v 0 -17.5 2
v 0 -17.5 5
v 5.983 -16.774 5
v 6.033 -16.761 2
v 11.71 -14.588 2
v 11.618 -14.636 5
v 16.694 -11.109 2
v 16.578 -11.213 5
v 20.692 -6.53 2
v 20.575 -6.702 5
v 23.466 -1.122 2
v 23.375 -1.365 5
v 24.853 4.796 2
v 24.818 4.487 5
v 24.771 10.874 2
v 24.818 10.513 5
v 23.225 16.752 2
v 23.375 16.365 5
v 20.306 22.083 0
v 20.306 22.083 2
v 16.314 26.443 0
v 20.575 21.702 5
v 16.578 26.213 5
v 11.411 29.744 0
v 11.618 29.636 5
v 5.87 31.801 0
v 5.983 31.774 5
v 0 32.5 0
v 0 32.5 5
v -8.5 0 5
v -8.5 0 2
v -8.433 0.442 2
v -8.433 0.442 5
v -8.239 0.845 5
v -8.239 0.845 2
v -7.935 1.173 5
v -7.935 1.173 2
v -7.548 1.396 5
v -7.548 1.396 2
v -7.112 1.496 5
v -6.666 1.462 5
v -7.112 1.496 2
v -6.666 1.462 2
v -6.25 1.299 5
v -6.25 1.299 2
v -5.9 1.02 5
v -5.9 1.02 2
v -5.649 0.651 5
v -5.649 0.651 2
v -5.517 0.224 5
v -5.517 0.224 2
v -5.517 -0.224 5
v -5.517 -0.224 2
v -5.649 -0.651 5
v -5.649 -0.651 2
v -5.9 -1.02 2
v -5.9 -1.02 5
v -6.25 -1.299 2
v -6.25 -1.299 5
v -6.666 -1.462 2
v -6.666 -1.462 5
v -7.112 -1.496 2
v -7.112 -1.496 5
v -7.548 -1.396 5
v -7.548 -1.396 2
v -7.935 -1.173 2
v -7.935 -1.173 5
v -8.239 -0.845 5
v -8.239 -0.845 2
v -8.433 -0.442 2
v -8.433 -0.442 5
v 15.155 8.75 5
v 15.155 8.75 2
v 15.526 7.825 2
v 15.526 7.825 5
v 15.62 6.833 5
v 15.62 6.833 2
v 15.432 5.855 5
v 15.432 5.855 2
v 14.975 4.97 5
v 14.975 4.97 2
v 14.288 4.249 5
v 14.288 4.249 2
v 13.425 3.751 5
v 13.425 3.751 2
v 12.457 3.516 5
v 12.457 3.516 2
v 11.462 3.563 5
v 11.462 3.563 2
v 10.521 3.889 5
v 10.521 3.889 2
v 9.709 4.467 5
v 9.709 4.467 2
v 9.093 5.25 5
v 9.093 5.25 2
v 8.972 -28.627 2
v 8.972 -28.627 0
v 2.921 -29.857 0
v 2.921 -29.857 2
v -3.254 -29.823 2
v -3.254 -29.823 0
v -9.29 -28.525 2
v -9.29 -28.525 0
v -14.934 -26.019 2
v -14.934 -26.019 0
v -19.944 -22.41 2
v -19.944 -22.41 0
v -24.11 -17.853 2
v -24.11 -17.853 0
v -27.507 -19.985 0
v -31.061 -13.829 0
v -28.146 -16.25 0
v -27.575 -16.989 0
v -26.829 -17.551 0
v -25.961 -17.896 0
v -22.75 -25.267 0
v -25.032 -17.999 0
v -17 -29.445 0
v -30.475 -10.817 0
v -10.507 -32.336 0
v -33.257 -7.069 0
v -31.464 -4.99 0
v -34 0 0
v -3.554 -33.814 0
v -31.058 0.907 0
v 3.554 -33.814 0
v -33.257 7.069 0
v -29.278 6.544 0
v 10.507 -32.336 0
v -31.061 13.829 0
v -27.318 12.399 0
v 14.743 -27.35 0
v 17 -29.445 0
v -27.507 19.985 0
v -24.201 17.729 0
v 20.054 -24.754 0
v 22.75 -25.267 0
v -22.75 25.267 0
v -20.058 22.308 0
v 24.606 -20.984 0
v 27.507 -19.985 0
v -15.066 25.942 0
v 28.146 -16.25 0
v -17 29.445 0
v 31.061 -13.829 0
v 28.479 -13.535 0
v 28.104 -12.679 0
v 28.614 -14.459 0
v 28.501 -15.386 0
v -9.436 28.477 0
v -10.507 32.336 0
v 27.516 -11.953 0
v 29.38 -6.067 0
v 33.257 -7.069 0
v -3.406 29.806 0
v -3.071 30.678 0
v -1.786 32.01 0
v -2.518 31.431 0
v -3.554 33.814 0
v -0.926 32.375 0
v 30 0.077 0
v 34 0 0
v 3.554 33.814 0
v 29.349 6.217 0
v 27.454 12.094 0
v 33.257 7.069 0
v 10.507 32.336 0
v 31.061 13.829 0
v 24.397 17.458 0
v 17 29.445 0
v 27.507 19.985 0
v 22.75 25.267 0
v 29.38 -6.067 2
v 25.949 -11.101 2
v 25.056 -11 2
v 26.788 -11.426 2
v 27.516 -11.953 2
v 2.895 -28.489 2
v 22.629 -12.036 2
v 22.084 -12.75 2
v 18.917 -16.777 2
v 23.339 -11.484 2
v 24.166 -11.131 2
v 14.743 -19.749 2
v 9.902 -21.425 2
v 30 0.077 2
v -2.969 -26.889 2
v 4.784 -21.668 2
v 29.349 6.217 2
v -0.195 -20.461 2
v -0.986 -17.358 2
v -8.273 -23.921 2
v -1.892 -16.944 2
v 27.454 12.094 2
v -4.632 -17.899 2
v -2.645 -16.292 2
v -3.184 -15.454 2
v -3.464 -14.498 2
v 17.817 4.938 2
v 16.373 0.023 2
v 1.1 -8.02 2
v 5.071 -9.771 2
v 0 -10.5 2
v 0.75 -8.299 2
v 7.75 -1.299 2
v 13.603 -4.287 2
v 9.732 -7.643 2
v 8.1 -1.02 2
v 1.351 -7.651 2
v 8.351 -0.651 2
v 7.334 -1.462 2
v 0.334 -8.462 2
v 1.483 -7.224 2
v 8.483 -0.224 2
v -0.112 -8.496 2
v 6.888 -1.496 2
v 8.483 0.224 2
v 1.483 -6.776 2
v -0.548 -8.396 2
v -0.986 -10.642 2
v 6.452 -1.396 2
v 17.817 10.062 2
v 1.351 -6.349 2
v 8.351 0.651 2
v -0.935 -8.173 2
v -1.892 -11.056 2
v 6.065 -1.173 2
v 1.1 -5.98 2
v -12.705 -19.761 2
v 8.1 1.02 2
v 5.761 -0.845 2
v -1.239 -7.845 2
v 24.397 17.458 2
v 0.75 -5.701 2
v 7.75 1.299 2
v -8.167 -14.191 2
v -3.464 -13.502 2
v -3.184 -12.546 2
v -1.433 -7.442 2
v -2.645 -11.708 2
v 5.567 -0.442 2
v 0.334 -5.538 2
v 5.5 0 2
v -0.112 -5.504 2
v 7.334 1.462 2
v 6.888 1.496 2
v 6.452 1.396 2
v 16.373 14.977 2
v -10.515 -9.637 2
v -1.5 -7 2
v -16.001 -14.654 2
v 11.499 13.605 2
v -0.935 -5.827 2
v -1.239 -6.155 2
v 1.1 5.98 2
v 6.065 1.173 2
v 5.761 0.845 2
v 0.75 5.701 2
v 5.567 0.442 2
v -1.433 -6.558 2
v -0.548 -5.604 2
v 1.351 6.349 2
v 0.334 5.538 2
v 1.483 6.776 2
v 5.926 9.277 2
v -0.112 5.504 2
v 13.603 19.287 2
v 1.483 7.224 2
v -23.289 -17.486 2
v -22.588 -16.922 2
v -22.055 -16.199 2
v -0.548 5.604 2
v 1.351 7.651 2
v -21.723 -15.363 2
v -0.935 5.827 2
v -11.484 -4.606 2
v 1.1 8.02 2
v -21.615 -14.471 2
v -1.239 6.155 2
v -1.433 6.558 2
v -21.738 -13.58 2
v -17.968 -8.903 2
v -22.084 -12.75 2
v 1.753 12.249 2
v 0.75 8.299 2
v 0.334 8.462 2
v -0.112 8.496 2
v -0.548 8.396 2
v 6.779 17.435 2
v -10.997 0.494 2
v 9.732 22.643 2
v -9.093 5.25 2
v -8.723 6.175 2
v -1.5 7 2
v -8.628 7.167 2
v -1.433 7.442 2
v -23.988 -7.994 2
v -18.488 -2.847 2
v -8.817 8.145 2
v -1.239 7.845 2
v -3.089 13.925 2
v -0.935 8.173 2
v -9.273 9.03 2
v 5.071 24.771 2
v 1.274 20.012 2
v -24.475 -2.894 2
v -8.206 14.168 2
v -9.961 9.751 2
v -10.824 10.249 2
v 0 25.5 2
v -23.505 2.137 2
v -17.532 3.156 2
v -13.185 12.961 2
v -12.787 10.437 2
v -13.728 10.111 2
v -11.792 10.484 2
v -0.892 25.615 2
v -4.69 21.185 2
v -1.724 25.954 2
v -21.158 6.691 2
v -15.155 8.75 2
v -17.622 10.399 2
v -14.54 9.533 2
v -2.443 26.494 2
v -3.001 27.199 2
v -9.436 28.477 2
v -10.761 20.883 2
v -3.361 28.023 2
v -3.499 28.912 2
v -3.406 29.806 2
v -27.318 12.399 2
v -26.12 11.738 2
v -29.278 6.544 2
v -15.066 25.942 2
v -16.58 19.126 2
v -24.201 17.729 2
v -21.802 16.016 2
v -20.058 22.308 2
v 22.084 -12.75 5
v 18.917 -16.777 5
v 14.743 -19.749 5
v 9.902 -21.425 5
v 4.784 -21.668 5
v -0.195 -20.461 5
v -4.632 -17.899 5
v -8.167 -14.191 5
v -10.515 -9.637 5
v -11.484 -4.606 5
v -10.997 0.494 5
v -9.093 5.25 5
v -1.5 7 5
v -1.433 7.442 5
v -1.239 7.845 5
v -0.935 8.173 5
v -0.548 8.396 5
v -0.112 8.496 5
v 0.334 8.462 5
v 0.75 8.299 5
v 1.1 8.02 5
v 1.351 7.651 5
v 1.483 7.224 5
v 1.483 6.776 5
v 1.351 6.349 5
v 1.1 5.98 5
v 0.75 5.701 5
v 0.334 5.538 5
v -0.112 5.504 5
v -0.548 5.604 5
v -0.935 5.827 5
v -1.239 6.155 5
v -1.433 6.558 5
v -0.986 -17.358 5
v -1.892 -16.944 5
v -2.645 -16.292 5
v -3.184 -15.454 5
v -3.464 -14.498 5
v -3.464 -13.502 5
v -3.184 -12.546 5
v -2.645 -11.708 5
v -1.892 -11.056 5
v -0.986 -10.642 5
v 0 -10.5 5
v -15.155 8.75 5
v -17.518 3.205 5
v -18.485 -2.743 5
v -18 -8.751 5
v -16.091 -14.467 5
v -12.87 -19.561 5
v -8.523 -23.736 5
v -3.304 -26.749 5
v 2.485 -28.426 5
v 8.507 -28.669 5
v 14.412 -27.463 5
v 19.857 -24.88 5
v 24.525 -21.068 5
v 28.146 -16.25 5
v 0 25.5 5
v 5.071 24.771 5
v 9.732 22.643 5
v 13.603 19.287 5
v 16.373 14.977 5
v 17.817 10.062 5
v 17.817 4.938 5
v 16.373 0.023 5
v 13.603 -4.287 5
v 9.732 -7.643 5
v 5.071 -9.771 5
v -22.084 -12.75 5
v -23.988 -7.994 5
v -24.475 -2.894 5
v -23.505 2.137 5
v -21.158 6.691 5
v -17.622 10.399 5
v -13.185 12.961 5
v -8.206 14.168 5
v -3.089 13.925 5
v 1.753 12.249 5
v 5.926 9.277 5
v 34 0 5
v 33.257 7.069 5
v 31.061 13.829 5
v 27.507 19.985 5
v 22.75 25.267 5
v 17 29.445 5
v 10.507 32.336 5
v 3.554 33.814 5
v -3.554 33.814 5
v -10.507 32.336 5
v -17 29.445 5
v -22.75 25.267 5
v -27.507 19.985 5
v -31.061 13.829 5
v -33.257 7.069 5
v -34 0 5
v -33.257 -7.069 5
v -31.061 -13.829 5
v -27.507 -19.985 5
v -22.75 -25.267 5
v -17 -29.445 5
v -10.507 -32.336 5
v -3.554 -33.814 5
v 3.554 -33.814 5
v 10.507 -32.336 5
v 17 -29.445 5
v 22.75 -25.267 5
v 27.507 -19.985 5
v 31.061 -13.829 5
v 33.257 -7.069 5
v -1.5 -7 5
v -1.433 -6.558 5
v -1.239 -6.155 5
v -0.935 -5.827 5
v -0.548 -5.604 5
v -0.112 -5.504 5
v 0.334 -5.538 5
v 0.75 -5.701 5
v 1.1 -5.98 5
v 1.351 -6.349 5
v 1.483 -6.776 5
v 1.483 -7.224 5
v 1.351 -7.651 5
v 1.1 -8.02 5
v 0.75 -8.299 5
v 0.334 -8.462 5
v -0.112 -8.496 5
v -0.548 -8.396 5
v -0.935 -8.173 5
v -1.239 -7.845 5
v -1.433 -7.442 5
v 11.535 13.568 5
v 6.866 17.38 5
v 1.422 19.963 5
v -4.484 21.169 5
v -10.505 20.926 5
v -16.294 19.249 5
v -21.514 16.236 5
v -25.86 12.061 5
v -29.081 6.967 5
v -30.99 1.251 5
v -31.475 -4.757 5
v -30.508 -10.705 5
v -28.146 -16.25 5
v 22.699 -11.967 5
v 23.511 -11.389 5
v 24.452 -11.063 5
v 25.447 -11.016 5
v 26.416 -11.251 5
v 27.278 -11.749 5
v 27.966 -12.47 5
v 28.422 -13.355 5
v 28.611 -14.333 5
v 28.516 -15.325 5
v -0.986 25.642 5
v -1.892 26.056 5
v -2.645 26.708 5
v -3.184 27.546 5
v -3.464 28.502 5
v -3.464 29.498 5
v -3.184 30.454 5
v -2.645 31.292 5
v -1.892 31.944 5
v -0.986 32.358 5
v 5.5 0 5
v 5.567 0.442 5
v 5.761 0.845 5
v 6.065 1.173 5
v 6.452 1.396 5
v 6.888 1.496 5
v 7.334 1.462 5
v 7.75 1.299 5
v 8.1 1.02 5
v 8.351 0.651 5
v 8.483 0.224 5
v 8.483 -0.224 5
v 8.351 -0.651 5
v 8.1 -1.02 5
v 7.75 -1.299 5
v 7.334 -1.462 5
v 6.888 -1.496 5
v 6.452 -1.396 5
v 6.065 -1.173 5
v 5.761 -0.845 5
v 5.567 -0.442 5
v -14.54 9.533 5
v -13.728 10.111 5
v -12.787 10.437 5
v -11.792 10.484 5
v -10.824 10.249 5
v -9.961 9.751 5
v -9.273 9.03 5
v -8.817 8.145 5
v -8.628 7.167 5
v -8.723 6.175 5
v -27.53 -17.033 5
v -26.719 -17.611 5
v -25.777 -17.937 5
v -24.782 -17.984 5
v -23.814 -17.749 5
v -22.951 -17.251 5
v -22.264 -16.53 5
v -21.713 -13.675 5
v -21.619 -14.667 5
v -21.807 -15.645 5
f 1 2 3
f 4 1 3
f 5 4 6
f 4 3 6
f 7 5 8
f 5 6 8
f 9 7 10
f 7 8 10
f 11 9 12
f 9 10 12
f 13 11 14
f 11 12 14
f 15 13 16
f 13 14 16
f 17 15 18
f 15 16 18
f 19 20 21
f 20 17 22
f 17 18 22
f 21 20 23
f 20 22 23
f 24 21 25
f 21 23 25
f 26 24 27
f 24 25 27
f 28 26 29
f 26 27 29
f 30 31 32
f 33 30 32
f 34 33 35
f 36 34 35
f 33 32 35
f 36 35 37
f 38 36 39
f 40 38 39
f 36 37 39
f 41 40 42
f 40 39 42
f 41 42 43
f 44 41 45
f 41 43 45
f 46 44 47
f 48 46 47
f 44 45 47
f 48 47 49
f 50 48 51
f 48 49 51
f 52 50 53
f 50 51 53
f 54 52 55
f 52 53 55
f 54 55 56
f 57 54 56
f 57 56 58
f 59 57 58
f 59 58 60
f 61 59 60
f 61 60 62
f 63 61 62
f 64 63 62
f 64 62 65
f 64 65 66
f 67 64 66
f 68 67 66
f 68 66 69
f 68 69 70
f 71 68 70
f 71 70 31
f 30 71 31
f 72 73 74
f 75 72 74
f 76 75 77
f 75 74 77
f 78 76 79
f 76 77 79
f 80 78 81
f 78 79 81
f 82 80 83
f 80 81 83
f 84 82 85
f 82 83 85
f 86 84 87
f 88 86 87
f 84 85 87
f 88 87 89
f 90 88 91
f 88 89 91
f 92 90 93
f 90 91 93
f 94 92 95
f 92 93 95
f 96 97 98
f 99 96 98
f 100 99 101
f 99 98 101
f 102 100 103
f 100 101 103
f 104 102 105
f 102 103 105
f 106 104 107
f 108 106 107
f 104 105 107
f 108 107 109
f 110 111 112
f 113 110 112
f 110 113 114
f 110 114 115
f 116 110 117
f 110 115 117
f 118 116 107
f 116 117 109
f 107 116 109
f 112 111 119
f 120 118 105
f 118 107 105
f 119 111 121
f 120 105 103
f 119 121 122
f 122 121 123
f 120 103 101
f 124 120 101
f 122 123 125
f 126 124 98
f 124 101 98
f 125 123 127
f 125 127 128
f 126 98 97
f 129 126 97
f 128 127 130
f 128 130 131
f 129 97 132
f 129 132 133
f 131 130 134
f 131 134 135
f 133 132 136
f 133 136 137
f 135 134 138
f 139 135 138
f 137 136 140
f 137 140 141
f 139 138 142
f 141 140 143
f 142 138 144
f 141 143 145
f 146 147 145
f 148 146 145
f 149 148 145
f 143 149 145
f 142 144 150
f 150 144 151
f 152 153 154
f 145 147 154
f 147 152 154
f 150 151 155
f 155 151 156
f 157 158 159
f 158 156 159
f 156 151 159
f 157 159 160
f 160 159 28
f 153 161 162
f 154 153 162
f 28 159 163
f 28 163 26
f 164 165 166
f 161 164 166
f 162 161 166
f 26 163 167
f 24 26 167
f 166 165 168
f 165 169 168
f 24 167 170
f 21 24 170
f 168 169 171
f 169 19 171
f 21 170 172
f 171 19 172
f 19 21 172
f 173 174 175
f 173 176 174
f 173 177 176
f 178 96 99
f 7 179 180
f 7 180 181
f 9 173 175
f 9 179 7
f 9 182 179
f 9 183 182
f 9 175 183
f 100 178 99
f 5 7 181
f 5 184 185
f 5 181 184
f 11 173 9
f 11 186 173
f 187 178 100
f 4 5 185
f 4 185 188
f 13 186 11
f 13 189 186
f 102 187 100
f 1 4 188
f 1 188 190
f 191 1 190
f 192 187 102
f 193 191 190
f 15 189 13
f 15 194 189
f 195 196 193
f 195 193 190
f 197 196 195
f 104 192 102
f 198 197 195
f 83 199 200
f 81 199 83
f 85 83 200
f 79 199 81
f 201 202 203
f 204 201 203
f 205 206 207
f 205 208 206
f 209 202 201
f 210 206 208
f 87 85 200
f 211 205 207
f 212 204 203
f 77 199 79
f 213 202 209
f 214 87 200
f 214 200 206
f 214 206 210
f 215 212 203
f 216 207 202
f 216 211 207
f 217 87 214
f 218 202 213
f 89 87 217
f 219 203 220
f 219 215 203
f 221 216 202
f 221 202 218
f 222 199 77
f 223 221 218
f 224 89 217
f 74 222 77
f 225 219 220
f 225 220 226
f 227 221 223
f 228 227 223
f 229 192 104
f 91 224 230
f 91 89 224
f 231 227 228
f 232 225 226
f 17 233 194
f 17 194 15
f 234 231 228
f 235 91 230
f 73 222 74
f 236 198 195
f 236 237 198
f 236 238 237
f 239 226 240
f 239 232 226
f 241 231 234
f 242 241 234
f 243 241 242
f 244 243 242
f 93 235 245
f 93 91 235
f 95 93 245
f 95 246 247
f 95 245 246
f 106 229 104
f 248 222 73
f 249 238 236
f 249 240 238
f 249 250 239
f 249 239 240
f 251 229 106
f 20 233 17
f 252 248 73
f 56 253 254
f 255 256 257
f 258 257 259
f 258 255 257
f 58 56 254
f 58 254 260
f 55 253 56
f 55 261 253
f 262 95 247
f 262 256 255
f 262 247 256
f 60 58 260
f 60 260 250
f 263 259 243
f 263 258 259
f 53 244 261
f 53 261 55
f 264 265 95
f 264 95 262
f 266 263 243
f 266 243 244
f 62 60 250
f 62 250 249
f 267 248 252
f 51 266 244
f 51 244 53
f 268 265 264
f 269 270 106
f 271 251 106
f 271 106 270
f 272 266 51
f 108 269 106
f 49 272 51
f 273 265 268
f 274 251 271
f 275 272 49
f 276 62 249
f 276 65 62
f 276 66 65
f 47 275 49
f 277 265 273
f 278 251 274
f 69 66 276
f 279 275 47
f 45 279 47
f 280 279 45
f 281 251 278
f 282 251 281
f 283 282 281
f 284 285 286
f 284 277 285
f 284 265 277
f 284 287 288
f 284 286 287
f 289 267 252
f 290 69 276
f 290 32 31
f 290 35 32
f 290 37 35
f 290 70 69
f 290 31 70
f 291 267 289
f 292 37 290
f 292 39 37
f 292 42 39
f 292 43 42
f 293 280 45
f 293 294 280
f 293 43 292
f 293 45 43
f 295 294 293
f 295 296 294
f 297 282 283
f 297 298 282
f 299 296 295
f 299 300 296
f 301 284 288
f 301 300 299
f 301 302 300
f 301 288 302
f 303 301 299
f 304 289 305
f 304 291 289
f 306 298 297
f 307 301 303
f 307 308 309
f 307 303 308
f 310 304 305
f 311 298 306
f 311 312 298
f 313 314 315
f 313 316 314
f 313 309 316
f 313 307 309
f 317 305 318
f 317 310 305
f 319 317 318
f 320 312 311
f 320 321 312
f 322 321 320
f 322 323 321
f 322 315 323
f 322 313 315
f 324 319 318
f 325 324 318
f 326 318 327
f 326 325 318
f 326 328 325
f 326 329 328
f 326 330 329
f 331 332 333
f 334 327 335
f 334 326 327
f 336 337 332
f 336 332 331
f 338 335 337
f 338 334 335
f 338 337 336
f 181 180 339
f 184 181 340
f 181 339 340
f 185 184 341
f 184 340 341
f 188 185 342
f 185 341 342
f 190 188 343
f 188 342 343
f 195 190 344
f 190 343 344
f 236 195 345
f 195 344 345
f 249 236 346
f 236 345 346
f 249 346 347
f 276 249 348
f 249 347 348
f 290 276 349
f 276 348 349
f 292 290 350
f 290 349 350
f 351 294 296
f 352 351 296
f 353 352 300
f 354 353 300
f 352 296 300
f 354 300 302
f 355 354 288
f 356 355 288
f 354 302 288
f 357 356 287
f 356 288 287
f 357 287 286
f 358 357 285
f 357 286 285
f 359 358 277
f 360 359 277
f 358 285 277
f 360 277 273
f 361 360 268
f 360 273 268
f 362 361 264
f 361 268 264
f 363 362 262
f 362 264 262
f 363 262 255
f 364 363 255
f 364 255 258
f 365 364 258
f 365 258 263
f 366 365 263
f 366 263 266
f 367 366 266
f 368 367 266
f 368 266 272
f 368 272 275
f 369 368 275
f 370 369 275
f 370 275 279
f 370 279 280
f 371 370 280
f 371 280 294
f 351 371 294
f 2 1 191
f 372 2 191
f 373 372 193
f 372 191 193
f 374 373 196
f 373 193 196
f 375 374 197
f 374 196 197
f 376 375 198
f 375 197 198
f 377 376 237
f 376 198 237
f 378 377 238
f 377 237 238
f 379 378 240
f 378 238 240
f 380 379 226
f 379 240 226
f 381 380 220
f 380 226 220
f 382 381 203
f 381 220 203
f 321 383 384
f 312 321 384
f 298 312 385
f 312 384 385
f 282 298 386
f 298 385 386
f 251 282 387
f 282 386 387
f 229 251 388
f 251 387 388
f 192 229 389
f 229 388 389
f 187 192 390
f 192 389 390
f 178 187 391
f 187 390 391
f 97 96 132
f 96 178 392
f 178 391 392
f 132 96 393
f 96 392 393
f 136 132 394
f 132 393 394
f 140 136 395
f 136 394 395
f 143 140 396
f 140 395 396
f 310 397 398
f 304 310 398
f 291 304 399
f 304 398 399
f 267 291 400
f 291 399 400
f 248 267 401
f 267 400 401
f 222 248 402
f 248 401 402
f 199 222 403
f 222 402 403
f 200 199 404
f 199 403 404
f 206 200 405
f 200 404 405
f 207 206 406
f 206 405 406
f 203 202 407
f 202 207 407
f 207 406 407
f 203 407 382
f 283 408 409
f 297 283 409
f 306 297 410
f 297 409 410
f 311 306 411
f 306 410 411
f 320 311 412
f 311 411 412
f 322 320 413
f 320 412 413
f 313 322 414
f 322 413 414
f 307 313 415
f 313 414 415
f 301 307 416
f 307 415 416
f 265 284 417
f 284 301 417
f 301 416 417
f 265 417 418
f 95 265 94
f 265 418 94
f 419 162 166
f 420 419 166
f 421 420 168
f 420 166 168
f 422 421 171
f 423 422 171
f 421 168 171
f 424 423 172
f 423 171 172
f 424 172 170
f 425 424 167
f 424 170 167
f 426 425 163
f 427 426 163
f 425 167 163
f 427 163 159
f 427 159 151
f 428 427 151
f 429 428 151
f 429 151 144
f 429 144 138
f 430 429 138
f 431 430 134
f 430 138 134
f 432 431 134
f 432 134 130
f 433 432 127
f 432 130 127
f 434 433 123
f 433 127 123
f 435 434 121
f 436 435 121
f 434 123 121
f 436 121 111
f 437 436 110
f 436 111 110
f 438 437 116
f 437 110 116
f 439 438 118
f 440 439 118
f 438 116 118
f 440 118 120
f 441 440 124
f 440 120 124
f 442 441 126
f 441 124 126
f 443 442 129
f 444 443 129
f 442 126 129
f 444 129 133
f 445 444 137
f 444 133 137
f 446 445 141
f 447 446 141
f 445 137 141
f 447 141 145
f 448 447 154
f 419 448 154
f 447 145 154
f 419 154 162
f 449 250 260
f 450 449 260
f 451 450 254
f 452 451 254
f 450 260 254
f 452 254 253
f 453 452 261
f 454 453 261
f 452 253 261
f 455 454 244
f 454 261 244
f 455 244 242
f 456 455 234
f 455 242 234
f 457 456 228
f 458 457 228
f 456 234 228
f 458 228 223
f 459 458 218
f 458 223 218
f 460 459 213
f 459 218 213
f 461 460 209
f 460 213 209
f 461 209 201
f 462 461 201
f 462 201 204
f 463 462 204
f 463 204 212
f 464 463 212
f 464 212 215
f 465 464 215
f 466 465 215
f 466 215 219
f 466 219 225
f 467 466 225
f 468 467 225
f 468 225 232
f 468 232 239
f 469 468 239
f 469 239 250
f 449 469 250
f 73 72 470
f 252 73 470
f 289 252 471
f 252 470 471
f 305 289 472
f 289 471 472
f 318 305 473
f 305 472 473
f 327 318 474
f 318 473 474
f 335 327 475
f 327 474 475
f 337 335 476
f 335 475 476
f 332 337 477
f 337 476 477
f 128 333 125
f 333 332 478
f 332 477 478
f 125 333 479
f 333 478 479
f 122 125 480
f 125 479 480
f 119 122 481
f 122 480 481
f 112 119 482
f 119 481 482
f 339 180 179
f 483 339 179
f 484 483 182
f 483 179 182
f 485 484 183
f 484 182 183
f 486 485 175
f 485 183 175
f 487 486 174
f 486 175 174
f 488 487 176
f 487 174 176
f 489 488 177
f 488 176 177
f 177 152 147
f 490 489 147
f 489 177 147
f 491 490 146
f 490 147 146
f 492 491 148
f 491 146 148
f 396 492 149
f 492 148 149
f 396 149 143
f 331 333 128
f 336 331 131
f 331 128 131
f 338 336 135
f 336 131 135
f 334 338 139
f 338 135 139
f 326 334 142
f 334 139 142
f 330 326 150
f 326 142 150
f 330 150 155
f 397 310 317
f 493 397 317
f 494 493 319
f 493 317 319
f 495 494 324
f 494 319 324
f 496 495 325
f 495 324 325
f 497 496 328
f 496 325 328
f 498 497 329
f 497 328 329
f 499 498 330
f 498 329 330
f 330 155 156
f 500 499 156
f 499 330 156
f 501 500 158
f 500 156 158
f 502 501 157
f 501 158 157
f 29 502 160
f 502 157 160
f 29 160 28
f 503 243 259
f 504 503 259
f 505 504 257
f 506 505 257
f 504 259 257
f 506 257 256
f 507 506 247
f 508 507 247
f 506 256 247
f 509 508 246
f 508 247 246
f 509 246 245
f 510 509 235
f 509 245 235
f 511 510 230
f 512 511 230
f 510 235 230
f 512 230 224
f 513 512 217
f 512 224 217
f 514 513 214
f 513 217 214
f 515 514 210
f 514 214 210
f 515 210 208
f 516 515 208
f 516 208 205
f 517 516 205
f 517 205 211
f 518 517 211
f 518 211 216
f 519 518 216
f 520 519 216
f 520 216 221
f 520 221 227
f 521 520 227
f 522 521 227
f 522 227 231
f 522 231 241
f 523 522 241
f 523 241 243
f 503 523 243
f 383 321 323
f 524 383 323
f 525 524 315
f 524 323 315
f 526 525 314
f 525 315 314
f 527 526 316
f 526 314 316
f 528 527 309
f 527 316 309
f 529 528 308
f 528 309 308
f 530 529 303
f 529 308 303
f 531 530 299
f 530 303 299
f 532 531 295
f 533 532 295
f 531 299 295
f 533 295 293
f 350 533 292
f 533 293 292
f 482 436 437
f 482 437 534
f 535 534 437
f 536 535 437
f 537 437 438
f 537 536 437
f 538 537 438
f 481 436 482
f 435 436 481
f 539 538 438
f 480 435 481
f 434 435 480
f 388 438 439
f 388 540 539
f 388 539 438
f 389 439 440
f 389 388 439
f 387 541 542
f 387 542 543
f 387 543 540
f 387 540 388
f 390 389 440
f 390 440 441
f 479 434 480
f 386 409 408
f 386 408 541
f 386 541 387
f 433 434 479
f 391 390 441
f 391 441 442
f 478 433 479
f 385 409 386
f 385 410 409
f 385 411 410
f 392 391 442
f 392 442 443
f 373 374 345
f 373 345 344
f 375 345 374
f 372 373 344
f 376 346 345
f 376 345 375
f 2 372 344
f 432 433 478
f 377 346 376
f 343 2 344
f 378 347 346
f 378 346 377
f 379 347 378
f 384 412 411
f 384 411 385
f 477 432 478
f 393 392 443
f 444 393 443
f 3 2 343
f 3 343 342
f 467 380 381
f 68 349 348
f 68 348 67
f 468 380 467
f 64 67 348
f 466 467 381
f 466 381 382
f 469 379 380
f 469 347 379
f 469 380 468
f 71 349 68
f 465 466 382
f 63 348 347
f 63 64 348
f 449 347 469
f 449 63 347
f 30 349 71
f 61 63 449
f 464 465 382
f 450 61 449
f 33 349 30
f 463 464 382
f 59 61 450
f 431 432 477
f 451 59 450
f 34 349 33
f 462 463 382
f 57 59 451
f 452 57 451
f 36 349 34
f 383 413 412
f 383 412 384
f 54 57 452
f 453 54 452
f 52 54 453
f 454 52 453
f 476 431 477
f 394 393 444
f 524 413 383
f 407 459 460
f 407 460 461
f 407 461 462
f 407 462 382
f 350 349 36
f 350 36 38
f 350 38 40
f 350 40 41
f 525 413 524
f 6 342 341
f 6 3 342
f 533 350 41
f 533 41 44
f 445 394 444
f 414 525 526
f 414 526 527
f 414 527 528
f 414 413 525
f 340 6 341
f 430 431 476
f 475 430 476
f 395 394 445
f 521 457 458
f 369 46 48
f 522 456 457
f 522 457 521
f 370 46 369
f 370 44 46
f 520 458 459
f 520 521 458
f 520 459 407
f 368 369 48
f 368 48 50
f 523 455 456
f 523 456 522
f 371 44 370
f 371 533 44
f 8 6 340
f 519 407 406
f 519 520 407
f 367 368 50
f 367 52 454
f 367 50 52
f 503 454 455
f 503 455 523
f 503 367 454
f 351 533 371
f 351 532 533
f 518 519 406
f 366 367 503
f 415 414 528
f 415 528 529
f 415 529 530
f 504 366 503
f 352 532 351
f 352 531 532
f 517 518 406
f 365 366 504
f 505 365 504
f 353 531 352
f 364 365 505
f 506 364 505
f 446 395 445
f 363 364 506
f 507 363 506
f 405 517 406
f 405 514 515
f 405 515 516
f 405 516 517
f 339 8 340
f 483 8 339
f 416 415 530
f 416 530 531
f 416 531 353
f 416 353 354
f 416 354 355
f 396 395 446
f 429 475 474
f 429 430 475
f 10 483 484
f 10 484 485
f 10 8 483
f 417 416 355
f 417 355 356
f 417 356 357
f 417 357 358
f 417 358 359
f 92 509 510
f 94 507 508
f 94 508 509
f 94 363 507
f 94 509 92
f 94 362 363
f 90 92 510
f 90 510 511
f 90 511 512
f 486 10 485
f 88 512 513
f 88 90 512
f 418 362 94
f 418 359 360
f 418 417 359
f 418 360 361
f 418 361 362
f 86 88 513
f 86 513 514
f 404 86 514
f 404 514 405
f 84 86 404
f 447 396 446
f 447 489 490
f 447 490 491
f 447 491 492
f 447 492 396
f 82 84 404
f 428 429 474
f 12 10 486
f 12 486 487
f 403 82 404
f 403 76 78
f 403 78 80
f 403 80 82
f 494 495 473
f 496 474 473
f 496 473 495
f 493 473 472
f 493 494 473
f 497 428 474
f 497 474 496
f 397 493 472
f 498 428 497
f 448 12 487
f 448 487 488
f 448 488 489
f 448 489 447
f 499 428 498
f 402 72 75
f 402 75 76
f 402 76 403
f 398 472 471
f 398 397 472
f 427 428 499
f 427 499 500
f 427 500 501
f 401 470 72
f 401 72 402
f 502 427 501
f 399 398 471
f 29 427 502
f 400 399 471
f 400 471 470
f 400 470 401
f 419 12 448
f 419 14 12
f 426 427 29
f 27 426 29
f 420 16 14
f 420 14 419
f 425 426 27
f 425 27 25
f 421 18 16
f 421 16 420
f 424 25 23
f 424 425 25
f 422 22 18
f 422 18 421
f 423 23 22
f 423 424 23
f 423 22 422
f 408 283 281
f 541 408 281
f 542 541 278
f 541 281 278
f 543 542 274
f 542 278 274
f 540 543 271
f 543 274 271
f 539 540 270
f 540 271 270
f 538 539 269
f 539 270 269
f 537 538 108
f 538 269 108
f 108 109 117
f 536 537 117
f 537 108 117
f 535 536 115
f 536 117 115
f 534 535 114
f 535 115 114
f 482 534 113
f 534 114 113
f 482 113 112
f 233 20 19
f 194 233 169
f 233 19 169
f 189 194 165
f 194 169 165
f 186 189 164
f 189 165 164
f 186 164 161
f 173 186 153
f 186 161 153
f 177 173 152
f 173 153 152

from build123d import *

# Parameters (mm, degrees)
SKETCH2_R               = 34
BOSS_EXTRUDE1_DEPTH     = 5
CUT_EXTRUDE_THIN1_REACH = 50.343
CUT_EXTRUDE1_REACH      = 50.343
SKETCH7_R               = 1.5
CUT_EXTRUDE2_REACH      = 50.343
SKETCH8_R               = 3.5
SKETCH9_R               = 30
CUT_EXTRUDE3_DEPTH      = 2


with BuildPart() as part:
    # Sketch2 → Boss-Extrude1 (new body)
    with BuildSketch(Plane.XY):
        Circle(SKETCH2_R)
    extrude(amount=BOSS_EXTRUDE1_DEPTH)

    # Sketch3 → Cut-Extrude-Thin1 (cut, up to next)
    with BuildSketch(Plane.XY.offset(5), mode=Mode.PRIVATE) as cut_extrude_thin1_sk1:
        with BuildLine():
            ThreePointArc((0, 25.5), (18, 7.5), (0, -10.5))
            Line((0, -10.5), (0, -17.5))
            ThreePointArc((0, -17.5), (25, 7.5), (0, 32.5))
            Line((0, 32.5), (0, 25.5))
        make_face()
    cut_extrude_thin1_tool1 = extrude(cut_extrude_thin1_sk1.sketch, amount=-CUT_EXTRUDE_THIN1_REACH, mode=Mode.PRIVATE) & part.part
    # Sketch3 → Cut-Extrude-Thin1 (cut, up to next)
    with BuildSketch(Plane.XY.offset(5), mode=Mode.PRIVATE) as cut_extrude_thin1_sk2:
        with BuildLine():
            ThreePointArc((22.083647797, -12.75), (-2.504809472, -19.338457268), (-9.09326674, 5.25))
            Line((-9.09326674, 5.25), (-15.155444566, 8.75))
            ThreePointArc((-15.155444566, 8.75), (-6.004809472, -25.400635095), (28.145825623, -16.25))
            Line((28.145825623, -16.25), (22.083647797, -12.75))
        make_face()
    cut_extrude_thin1_tool2 = extrude(cut_extrude_thin1_sk2.sketch, amount=-CUT_EXTRUDE_THIN1_REACH, mode=Mode.PRIVATE) & part.part
    # Sketch3 → Cut-Extrude-Thin1 (cut, up to next)
    with BuildSketch(Plane.XY.offset(5), mode=Mode.PRIVATE) as cut_extrude_thin1_sk3:
        with BuildLine():
            ThreePointArc((-22.083647797, -12.75), (-15.495190528, 11.838457268), (9.09326674, 5.25))
            Line((9.09326674, 5.25), (15.155444566, 8.75))
            ThreePointArc((15.155444566, 8.75), (-18.995190528, 17.900635095), (-28.145825623, -16.25))
            Line((-28.145825623, -16.25), (-22.083647797, -12.75))
        make_face()
    cut_extrude_thin1_tool3 = extrude(cut_extrude_thin1_sk3.sketch, amount=-CUT_EXTRUDE_THIN1_REACH, mode=Mode.PRIVATE) & part.part
    add(cut_extrude_thin1_tool1.solids().sort_by_distance((0.559017, 29, 5))[0], mode=Mode.SUBTRACT)
    add(cut_extrude_thin1_tool2.solids().sort_by_distance((-2.804081, -19.85681, 5))[0], mode=Mode.SUBTRACT)
    add(cut_extrude_thin1_tool3.solids().sort_by_distance((-15.794462, 12.35681, 5))[0], mode=Mode.SUBTRACT)

    # Sketch7 → Cut-Extrude1 (cut, up to next)
    with BuildSketch(Plane(origin=(0, 0, 0), x_dir=(-1, 0, 0), z_dir=(0, 0, -1)), mode=Mode.PRIVATE) as cut_extrude1_sk1:
        with Locations((7, 0)):
            Circle(SKETCH7_R)
    cut_extrude1_tool1 = extrude(cut_extrude1_sk1.sketch, amount=-CUT_EXTRUDE1_REACH, mode=Mode.PRIVATE) & part.part
    # Sketch7 → Cut-Extrude1 (cut, up to next)
    with BuildSketch(Plane(origin=(0, 0, 0), x_dir=(-1, 0, 0), z_dir=(0, 0, -1)), mode=Mode.PRIVATE) as cut_extrude1_sk2:
        with Locations((0, -7)):
            Circle(SKETCH7_R)
    cut_extrude1_tool2 = extrude(cut_extrude1_sk2.sketch, amount=-CUT_EXTRUDE1_REACH, mode=Mode.PRIVATE) & part.part
    # Sketch7 → Cut-Extrude1 (cut, up to next)
    with BuildSketch(Plane(origin=(0, 0, 0), x_dir=(-1, 0, 0), z_dir=(0, 0, -1)), mode=Mode.PRIVATE) as cut_extrude1_sk3:
        with Locations((-7, 0)):
            Circle(SKETCH7_R)
    cut_extrude1_tool3 = extrude(cut_extrude1_sk3.sketch, amount=-CUT_EXTRUDE1_REACH, mode=Mode.PRIVATE) & part.part
    # Sketch7 → Cut-Extrude1 (cut, up to next)
    with BuildSketch(Plane(origin=(0, 0, 0), x_dir=(-1, 0, 0), z_dir=(0, 0, -1)), mode=Mode.PRIVATE) as cut_extrude1_sk4:
        with Locations((0, 7)):
            Circle(SKETCH7_R)
    cut_extrude1_tool4 = extrude(cut_extrude1_sk4.sketch, amount=-CUT_EXTRUDE1_REACH, mode=Mode.PRIVATE) & part.part
    add(cut_extrude1_tool1.solids().sort_by_distance((-7, 0, 0))[0], mode=Mode.SUBTRACT)
    add(cut_extrude1_tool2.solids().sort_by_distance((0, -7, 0))[0], mode=Mode.SUBTRACT)
    add(cut_extrude1_tool3.solids().sort_by_distance((7, 0, 0))[0], mode=Mode.SUBTRACT)
    add(cut_extrude1_tool4.solids().sort_by_distance((0, 7, 0))[0], mode=Mode.SUBTRACT)

    # Sketch8 → Cut-Extrude2 (cut, up to next)
    with BuildSketch(Plane(origin=(0, 0, 0), x_dir=(-1, 0, 0), z_dir=(0, 0, -1)), mode=Mode.PRIVATE) as cut_extrude2_sk1:
        with Locations((0, 29)):
            Circle(SKETCH8_R)
    cut_extrude2_tool1 = extrude(cut_extrude2_sk1.sketch, amount=-CUT_EXTRUDE2_REACH, mode=Mode.PRIVATE) & part.part
    # Sketch8 → Cut-Extrude2 (cut, up to next)
    with BuildSketch(Plane(origin=(0, 0, 0), x_dir=(-1, 0, 0), z_dir=(0, 0, -1)), mode=Mode.PRIVATE) as cut_extrude2_sk2:
        with Locations((-12.124355653, 7)):
            Circle(SKETCH8_R)
    cut_extrude2_tool2 = extrude(cut_extrude2_sk2.sketch, amount=-CUT_EXTRUDE2_REACH, mode=Mode.PRIVATE) & part.part
    # Sketch8 → Cut-Extrude2 (cut, up to next)
    with BuildSketch(Plane(origin=(0, 0, 0), x_dir=(-1, 0, 0), z_dir=(0, 0, -1)), mode=Mode.PRIVATE) as cut_extrude2_sk3:
        with Locations((12.124355653, 7)):
            Circle(SKETCH8_R)
    cut_extrude2_tool3 = extrude(cut_extrude2_sk3.sketch, amount=-CUT_EXTRUDE2_REACH, mode=Mode.PRIVATE) & part.part
    # Sketch8 → Cut-Extrude2 (cut, up to next)
    with BuildSketch(Plane(origin=(0, 0, 0), x_dir=(-1, 0, 0), z_dir=(0, 0, -1)), mode=Mode.PRIVATE) as cut_extrude2_sk4:
        with Locations((25.11473671, -14.5)):
            Circle(SKETCH8_R)
    cut_extrude2_tool4 = extrude(cut_extrude2_sk4.sketch, amount=-CUT_EXTRUDE2_REACH, mode=Mode.PRIVATE) & part.part
    # Sketch8 → Cut-Extrude2 (cut, up to next)
    with BuildSketch(Plane(origin=(0, 0, 0), x_dir=(-1, 0, 0), z_dir=(0, 0, -1)), mode=Mode.PRIVATE) as cut_extrude2_sk5:
        with Locations((-25.11473671, -14.5)):
            Circle(SKETCH8_R)
    cut_extrude2_tool5 = extrude(cut_extrude2_sk5.sketch, amount=-CUT_EXTRUDE2_REACH, mode=Mode.PRIVATE) & part.part
    # Sketch8 → Cut-Extrude2 (cut, up to next)
    with BuildSketch(Plane(origin=(0, 0, 0), x_dir=(-1, 0, 0), z_dir=(0, 0, -1)), mode=Mode.PRIVATE) as cut_extrude2_sk6:
        with Locations((0, -14)):
            Circle(SKETCH8_R)
    cut_extrude2_tool6 = extrude(cut_extrude2_sk6.sketch, amount=-CUT_EXTRUDE2_REACH, mode=Mode.PRIVATE) & part.part
    add(cut_extrude2_tool1.solids().sort_by_distance((0, 29, 0))[0], mode=Mode.SUBTRACT)
    add(cut_extrude2_tool2.solids().sort_by_distance((12.124356, 7, 0))[0], mode=Mode.SUBTRACT)
    add(cut_extrude2_tool3.solids().sort_by_distance((-12.124356, 7, 0))[0], mode=Mode.SUBTRACT)
    add(cut_extrude2_tool4.solids().sort_by_distance((-25.114737, -14.5, 0))[0], mode=Mode.SUBTRACT)
    add(cut_extrude2_tool5.solids().sort_by_distance((25.114737, -14.5, 0))[0], mode=Mode.SUBTRACT)
    add(cut_extrude2_tool6.solids().sort_by_distance((0, -14, 0))[0], mode=Mode.SUBTRACT)

    # Sketch9 → Cut-Extrude3 (cut)
    with BuildSketch(Plane(origin=(0, 0, 0), x_dir=(-1, 0, 0), z_dir=(0, 0, -1))):
        Circle(SKETCH9_R)
    extrude(amount=-CUT_EXTRUDE3_DEPTH, mode=Mode.SUBTRACT)


solid = part.part
